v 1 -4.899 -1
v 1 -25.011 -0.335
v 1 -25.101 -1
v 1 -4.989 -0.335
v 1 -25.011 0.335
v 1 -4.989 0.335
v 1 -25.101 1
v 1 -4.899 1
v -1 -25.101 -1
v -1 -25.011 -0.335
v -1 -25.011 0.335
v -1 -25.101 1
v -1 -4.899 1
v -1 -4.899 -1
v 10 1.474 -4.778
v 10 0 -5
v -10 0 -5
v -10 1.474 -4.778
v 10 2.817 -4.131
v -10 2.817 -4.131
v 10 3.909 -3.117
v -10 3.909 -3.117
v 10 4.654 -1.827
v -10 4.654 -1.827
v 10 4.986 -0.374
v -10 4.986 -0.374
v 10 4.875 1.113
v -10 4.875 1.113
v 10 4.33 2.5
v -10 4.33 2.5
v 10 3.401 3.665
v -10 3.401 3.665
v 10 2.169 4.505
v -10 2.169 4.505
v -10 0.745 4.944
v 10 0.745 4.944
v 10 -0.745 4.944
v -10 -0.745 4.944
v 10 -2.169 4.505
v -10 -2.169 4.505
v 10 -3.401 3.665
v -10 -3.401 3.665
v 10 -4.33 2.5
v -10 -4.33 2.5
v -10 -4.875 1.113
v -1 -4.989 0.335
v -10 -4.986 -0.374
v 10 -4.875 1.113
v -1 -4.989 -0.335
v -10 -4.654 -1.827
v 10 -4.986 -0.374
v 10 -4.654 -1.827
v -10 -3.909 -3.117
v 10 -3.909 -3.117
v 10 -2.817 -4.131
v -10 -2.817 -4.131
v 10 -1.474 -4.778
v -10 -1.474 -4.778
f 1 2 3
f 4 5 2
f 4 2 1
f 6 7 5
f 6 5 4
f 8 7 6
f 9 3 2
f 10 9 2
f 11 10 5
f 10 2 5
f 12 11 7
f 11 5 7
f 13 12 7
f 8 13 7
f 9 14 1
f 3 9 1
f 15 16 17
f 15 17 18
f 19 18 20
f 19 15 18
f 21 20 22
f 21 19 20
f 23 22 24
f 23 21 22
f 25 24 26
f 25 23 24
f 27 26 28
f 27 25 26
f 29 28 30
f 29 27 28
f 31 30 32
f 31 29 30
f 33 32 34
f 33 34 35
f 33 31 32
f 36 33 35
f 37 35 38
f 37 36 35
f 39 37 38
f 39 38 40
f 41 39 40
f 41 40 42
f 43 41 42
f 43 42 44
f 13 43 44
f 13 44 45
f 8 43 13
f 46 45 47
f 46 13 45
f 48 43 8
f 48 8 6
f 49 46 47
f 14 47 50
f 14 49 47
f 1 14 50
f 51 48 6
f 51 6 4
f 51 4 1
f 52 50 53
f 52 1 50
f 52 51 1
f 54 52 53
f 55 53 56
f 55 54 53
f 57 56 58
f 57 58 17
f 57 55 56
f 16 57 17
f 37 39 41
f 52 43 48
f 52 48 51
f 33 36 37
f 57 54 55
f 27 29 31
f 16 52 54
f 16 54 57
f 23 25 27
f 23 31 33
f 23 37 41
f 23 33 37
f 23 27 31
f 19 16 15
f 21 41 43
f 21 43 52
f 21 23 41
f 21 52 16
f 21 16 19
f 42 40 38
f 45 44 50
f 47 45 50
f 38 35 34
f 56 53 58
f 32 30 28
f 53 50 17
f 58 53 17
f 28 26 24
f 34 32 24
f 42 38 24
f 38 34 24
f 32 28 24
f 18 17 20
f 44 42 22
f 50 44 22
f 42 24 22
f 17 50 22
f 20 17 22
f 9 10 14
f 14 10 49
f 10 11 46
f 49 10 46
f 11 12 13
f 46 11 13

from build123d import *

# Parameters (mm, degrees)
SKETCH1_R           = 5
BOSS_EXTRUDE1_DEPTH = 10
SKETCH2_W           = 2
SKETCH2_H           = 30
BOSS_EXTRUDE2_DEPTH = 1
SKETCH3_R           = 5
CUT_EXTRUDE1_DEPTH  = 33.341923258


with BuildPart() as part:
    # Sketch1 → Boss-Extrude1 (new, symmetric)
    with BuildSketch(Plane(origin=(0, 0, 0), x_dir=(0, 0, -1), z_dir=(1, 0, 0))):
        Circle(SKETCH1_R)
    extrude(amount=BOSS_EXTRUDE1_DEPTH, both=True)

    # Sketch2 → Boss-Extrude2 (add, symmetric)
    with BuildSketch(Plane.XY):
        with Locations((0, -15)):
            Rectangle(SKETCH2_W, SKETCH2_H)
    extrude(amount=BOSS_EXTRUDE2_DEPTH, both=True)

    # Sketch3 → Cut-Extrude1 (cut, through all)
    with BuildSketch(Plane(origin=(1, 0, 0), x_dir=(0, 0, -1), z_dir=(1, 0, 0))):
        with Locations((0, -30)):
            Circle(SKETCH3_R)
    extrude(amount=-CUT_EXTRUDE1_DEPTH, mode=Mode.SUBTRACT)


solid = part.part
